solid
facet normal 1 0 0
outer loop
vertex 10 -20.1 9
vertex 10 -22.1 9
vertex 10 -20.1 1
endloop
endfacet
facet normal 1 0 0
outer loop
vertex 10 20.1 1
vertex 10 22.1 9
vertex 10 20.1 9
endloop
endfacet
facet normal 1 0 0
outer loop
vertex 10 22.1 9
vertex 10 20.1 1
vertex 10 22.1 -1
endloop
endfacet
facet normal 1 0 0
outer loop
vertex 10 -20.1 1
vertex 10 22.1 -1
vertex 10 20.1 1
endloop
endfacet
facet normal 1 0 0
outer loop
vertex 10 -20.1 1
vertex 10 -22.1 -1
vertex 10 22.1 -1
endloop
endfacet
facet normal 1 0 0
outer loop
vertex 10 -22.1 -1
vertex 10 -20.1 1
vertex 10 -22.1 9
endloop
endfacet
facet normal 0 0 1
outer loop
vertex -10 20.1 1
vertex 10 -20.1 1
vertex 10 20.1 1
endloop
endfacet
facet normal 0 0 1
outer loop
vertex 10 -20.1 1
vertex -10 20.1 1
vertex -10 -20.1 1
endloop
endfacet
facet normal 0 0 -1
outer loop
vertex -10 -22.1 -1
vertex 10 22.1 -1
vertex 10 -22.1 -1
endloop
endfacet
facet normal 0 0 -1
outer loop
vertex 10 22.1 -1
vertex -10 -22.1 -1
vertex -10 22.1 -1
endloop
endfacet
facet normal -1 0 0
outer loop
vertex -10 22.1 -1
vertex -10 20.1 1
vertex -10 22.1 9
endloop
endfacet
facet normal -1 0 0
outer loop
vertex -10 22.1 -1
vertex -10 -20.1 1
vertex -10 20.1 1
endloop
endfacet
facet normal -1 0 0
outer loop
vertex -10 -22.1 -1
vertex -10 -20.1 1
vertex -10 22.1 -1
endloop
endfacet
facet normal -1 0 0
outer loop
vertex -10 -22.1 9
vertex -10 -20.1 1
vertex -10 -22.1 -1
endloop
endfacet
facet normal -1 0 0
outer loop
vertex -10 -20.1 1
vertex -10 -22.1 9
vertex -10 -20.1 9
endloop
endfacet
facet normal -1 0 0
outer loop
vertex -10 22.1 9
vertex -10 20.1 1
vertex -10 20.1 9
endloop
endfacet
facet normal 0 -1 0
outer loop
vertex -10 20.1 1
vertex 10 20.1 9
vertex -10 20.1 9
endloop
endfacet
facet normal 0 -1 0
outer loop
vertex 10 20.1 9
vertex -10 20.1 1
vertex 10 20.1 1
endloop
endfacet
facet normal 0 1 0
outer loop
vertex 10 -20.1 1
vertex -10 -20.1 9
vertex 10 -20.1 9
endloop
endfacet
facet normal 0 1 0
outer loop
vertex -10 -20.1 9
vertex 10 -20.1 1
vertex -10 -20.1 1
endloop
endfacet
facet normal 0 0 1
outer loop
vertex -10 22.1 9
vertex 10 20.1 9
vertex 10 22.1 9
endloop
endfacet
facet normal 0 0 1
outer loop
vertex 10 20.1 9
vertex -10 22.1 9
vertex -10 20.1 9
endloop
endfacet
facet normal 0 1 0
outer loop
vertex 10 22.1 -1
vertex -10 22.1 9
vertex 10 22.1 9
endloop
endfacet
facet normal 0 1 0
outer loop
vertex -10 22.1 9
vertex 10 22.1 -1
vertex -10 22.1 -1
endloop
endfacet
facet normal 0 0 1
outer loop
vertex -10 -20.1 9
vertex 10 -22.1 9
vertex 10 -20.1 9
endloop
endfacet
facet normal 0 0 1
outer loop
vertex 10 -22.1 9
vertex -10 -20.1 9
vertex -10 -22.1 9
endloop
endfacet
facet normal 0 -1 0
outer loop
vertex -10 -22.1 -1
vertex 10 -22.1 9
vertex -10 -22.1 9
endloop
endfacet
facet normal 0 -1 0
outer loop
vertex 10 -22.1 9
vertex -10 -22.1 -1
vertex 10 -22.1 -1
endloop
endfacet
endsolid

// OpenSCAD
// 29.24 from hole to hole
thickness = 2.0;
height = thickness;
correction_shim = 0.2;
width = 40 + correction_shim;
length = 20;
flange_depth = 10;
fn = 128;

module render()
{
  union() {
    cube(size = [length, width, height], center=true);
    translate([0, width/2 + thickness/2, flange_depth/2 - thickness/2]) {
      cube(size = [length, thickness, flange_depth], center=true);
    }
    translate([0, -width/2 - thickness/2, flange_depth/2 - thickness/2]) {
      cube(size = [length, thickness, flange_depth], center=true);
    }
  }
}

echo(version=version());

render();
